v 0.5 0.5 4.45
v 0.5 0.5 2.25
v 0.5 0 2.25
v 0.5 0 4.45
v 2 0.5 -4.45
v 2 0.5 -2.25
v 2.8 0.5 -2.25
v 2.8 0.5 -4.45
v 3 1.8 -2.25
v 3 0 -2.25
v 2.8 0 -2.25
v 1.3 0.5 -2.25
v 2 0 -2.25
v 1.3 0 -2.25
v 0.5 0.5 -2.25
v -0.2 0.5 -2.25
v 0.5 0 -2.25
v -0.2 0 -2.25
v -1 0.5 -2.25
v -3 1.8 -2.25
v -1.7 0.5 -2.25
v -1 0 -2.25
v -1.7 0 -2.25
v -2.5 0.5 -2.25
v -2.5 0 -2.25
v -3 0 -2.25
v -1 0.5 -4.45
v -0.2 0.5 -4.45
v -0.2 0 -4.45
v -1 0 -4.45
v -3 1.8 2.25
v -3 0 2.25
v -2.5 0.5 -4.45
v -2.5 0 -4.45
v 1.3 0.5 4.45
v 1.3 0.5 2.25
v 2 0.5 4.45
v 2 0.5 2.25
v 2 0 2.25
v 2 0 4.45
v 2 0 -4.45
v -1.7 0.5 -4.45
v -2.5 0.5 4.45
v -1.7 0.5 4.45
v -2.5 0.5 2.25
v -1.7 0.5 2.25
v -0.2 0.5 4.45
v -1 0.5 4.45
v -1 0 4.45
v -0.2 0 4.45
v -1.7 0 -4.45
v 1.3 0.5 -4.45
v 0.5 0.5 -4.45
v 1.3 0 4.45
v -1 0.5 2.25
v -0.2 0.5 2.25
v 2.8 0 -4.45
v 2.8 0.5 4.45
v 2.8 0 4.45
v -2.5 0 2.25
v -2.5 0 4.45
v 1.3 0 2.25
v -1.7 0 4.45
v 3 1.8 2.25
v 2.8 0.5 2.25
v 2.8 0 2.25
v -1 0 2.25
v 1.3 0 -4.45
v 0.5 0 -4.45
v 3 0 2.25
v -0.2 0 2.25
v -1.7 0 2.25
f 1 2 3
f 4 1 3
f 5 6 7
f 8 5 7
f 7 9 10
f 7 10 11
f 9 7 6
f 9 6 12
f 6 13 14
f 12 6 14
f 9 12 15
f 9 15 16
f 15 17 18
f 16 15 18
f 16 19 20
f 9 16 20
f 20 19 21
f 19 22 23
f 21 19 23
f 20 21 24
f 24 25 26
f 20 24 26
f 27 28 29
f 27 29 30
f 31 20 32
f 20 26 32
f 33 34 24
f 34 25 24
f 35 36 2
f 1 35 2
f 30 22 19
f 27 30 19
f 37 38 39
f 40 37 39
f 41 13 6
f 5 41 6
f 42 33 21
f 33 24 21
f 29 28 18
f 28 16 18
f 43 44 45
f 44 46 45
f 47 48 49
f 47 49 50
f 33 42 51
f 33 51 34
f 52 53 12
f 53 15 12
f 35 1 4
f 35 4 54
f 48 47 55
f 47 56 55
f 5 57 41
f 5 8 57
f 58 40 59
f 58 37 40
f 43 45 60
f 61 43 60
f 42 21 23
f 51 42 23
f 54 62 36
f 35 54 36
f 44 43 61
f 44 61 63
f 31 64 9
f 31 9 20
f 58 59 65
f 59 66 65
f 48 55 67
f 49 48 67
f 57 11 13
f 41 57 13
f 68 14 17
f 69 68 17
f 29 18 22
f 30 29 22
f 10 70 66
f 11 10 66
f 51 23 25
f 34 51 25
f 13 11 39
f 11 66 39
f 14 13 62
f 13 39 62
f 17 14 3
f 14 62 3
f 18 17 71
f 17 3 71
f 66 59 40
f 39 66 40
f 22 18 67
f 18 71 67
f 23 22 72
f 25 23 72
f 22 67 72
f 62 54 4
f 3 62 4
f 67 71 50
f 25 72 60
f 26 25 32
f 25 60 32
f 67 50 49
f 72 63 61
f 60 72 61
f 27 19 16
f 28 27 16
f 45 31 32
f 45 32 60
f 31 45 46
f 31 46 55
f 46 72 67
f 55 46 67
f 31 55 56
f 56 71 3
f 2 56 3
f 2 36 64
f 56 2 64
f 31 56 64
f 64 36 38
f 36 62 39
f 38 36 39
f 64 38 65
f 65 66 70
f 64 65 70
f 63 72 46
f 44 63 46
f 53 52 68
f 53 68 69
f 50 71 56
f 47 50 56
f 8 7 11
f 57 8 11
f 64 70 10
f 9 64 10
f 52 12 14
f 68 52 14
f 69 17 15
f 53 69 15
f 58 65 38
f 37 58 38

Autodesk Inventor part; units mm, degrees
ref_plane "YZ Plane" through (0, 0, 0) normal (1, 0, 0) x (0, 1, 0)
ref_plane "XZ Plane" through (0, 0, 0) normal (0, 1, 0) x (-1, 0, 0)
ref_plane "XY Plane" through (0, 0, 0) normal (0, 0, 1) x (1, 0, 0)
sketch "草圖1" plane through (0, 0, 0) normal (0, 1, 0) x (-1, 0, 0)
  line L0 (3, 2.25) -> (-3, 2.25)
  line L1 (-3, 2.25) -> (-3, -2.25)
  line L2 (-3, -2.25) -> (3, -2.25)
  line L3 (3, -2.25) -> (3, 2.25)
  line L4 (3, 2.25) -> (-3, -2.25) construction
  line L5 (-3, 2.25) -> (3, -2.25) construction
  point P0 (0, 0)
  dimension "d0" = 6
  dimension "d1" = 4.5
extrude "擠出1" add sketch "草圖1" along normal blind 1.8
sketch "草圖2" plane through (-3, 0, 2.25) normal (0, 0, 1) x (1, 0, 0)
  line L0 (6, 0) -> (0, 0) projected
  line L1 (0, 0) -> (0.5, 0)
  line L2 (0.5, 0) -> (1.3, 0)
  line L3 (1.3, 0) -> (1.3, 0.5)
  line L4 (1.3, 0.5) -> (0.5, 0.5)
  line L5 (0.5, 0.5) -> (0.5, 0)
  point P0 (3, 0)
  point P1 (1.3, 0)
  dimension "d4" = 0.5
  dimension "d5" = 0.8
  dimension "d6" = 0.5
extrude "擠出2" add sketch "草圖2" along normal blind 2.2
pattern_linear "矩形陣列1" count 4 spacing 1.5 along (1, 0, 0) of "擠出2"
mirror "鏡射1" about plane through (0, 0, 0) normal (0, 0, 1) of "擠出2", "矩形陣列1"
ref_plane "工作平面1" through (-3, 1.8, 0) normal (0, 0, 1) x (1, 0, 0)
properties part number "鏡射"
